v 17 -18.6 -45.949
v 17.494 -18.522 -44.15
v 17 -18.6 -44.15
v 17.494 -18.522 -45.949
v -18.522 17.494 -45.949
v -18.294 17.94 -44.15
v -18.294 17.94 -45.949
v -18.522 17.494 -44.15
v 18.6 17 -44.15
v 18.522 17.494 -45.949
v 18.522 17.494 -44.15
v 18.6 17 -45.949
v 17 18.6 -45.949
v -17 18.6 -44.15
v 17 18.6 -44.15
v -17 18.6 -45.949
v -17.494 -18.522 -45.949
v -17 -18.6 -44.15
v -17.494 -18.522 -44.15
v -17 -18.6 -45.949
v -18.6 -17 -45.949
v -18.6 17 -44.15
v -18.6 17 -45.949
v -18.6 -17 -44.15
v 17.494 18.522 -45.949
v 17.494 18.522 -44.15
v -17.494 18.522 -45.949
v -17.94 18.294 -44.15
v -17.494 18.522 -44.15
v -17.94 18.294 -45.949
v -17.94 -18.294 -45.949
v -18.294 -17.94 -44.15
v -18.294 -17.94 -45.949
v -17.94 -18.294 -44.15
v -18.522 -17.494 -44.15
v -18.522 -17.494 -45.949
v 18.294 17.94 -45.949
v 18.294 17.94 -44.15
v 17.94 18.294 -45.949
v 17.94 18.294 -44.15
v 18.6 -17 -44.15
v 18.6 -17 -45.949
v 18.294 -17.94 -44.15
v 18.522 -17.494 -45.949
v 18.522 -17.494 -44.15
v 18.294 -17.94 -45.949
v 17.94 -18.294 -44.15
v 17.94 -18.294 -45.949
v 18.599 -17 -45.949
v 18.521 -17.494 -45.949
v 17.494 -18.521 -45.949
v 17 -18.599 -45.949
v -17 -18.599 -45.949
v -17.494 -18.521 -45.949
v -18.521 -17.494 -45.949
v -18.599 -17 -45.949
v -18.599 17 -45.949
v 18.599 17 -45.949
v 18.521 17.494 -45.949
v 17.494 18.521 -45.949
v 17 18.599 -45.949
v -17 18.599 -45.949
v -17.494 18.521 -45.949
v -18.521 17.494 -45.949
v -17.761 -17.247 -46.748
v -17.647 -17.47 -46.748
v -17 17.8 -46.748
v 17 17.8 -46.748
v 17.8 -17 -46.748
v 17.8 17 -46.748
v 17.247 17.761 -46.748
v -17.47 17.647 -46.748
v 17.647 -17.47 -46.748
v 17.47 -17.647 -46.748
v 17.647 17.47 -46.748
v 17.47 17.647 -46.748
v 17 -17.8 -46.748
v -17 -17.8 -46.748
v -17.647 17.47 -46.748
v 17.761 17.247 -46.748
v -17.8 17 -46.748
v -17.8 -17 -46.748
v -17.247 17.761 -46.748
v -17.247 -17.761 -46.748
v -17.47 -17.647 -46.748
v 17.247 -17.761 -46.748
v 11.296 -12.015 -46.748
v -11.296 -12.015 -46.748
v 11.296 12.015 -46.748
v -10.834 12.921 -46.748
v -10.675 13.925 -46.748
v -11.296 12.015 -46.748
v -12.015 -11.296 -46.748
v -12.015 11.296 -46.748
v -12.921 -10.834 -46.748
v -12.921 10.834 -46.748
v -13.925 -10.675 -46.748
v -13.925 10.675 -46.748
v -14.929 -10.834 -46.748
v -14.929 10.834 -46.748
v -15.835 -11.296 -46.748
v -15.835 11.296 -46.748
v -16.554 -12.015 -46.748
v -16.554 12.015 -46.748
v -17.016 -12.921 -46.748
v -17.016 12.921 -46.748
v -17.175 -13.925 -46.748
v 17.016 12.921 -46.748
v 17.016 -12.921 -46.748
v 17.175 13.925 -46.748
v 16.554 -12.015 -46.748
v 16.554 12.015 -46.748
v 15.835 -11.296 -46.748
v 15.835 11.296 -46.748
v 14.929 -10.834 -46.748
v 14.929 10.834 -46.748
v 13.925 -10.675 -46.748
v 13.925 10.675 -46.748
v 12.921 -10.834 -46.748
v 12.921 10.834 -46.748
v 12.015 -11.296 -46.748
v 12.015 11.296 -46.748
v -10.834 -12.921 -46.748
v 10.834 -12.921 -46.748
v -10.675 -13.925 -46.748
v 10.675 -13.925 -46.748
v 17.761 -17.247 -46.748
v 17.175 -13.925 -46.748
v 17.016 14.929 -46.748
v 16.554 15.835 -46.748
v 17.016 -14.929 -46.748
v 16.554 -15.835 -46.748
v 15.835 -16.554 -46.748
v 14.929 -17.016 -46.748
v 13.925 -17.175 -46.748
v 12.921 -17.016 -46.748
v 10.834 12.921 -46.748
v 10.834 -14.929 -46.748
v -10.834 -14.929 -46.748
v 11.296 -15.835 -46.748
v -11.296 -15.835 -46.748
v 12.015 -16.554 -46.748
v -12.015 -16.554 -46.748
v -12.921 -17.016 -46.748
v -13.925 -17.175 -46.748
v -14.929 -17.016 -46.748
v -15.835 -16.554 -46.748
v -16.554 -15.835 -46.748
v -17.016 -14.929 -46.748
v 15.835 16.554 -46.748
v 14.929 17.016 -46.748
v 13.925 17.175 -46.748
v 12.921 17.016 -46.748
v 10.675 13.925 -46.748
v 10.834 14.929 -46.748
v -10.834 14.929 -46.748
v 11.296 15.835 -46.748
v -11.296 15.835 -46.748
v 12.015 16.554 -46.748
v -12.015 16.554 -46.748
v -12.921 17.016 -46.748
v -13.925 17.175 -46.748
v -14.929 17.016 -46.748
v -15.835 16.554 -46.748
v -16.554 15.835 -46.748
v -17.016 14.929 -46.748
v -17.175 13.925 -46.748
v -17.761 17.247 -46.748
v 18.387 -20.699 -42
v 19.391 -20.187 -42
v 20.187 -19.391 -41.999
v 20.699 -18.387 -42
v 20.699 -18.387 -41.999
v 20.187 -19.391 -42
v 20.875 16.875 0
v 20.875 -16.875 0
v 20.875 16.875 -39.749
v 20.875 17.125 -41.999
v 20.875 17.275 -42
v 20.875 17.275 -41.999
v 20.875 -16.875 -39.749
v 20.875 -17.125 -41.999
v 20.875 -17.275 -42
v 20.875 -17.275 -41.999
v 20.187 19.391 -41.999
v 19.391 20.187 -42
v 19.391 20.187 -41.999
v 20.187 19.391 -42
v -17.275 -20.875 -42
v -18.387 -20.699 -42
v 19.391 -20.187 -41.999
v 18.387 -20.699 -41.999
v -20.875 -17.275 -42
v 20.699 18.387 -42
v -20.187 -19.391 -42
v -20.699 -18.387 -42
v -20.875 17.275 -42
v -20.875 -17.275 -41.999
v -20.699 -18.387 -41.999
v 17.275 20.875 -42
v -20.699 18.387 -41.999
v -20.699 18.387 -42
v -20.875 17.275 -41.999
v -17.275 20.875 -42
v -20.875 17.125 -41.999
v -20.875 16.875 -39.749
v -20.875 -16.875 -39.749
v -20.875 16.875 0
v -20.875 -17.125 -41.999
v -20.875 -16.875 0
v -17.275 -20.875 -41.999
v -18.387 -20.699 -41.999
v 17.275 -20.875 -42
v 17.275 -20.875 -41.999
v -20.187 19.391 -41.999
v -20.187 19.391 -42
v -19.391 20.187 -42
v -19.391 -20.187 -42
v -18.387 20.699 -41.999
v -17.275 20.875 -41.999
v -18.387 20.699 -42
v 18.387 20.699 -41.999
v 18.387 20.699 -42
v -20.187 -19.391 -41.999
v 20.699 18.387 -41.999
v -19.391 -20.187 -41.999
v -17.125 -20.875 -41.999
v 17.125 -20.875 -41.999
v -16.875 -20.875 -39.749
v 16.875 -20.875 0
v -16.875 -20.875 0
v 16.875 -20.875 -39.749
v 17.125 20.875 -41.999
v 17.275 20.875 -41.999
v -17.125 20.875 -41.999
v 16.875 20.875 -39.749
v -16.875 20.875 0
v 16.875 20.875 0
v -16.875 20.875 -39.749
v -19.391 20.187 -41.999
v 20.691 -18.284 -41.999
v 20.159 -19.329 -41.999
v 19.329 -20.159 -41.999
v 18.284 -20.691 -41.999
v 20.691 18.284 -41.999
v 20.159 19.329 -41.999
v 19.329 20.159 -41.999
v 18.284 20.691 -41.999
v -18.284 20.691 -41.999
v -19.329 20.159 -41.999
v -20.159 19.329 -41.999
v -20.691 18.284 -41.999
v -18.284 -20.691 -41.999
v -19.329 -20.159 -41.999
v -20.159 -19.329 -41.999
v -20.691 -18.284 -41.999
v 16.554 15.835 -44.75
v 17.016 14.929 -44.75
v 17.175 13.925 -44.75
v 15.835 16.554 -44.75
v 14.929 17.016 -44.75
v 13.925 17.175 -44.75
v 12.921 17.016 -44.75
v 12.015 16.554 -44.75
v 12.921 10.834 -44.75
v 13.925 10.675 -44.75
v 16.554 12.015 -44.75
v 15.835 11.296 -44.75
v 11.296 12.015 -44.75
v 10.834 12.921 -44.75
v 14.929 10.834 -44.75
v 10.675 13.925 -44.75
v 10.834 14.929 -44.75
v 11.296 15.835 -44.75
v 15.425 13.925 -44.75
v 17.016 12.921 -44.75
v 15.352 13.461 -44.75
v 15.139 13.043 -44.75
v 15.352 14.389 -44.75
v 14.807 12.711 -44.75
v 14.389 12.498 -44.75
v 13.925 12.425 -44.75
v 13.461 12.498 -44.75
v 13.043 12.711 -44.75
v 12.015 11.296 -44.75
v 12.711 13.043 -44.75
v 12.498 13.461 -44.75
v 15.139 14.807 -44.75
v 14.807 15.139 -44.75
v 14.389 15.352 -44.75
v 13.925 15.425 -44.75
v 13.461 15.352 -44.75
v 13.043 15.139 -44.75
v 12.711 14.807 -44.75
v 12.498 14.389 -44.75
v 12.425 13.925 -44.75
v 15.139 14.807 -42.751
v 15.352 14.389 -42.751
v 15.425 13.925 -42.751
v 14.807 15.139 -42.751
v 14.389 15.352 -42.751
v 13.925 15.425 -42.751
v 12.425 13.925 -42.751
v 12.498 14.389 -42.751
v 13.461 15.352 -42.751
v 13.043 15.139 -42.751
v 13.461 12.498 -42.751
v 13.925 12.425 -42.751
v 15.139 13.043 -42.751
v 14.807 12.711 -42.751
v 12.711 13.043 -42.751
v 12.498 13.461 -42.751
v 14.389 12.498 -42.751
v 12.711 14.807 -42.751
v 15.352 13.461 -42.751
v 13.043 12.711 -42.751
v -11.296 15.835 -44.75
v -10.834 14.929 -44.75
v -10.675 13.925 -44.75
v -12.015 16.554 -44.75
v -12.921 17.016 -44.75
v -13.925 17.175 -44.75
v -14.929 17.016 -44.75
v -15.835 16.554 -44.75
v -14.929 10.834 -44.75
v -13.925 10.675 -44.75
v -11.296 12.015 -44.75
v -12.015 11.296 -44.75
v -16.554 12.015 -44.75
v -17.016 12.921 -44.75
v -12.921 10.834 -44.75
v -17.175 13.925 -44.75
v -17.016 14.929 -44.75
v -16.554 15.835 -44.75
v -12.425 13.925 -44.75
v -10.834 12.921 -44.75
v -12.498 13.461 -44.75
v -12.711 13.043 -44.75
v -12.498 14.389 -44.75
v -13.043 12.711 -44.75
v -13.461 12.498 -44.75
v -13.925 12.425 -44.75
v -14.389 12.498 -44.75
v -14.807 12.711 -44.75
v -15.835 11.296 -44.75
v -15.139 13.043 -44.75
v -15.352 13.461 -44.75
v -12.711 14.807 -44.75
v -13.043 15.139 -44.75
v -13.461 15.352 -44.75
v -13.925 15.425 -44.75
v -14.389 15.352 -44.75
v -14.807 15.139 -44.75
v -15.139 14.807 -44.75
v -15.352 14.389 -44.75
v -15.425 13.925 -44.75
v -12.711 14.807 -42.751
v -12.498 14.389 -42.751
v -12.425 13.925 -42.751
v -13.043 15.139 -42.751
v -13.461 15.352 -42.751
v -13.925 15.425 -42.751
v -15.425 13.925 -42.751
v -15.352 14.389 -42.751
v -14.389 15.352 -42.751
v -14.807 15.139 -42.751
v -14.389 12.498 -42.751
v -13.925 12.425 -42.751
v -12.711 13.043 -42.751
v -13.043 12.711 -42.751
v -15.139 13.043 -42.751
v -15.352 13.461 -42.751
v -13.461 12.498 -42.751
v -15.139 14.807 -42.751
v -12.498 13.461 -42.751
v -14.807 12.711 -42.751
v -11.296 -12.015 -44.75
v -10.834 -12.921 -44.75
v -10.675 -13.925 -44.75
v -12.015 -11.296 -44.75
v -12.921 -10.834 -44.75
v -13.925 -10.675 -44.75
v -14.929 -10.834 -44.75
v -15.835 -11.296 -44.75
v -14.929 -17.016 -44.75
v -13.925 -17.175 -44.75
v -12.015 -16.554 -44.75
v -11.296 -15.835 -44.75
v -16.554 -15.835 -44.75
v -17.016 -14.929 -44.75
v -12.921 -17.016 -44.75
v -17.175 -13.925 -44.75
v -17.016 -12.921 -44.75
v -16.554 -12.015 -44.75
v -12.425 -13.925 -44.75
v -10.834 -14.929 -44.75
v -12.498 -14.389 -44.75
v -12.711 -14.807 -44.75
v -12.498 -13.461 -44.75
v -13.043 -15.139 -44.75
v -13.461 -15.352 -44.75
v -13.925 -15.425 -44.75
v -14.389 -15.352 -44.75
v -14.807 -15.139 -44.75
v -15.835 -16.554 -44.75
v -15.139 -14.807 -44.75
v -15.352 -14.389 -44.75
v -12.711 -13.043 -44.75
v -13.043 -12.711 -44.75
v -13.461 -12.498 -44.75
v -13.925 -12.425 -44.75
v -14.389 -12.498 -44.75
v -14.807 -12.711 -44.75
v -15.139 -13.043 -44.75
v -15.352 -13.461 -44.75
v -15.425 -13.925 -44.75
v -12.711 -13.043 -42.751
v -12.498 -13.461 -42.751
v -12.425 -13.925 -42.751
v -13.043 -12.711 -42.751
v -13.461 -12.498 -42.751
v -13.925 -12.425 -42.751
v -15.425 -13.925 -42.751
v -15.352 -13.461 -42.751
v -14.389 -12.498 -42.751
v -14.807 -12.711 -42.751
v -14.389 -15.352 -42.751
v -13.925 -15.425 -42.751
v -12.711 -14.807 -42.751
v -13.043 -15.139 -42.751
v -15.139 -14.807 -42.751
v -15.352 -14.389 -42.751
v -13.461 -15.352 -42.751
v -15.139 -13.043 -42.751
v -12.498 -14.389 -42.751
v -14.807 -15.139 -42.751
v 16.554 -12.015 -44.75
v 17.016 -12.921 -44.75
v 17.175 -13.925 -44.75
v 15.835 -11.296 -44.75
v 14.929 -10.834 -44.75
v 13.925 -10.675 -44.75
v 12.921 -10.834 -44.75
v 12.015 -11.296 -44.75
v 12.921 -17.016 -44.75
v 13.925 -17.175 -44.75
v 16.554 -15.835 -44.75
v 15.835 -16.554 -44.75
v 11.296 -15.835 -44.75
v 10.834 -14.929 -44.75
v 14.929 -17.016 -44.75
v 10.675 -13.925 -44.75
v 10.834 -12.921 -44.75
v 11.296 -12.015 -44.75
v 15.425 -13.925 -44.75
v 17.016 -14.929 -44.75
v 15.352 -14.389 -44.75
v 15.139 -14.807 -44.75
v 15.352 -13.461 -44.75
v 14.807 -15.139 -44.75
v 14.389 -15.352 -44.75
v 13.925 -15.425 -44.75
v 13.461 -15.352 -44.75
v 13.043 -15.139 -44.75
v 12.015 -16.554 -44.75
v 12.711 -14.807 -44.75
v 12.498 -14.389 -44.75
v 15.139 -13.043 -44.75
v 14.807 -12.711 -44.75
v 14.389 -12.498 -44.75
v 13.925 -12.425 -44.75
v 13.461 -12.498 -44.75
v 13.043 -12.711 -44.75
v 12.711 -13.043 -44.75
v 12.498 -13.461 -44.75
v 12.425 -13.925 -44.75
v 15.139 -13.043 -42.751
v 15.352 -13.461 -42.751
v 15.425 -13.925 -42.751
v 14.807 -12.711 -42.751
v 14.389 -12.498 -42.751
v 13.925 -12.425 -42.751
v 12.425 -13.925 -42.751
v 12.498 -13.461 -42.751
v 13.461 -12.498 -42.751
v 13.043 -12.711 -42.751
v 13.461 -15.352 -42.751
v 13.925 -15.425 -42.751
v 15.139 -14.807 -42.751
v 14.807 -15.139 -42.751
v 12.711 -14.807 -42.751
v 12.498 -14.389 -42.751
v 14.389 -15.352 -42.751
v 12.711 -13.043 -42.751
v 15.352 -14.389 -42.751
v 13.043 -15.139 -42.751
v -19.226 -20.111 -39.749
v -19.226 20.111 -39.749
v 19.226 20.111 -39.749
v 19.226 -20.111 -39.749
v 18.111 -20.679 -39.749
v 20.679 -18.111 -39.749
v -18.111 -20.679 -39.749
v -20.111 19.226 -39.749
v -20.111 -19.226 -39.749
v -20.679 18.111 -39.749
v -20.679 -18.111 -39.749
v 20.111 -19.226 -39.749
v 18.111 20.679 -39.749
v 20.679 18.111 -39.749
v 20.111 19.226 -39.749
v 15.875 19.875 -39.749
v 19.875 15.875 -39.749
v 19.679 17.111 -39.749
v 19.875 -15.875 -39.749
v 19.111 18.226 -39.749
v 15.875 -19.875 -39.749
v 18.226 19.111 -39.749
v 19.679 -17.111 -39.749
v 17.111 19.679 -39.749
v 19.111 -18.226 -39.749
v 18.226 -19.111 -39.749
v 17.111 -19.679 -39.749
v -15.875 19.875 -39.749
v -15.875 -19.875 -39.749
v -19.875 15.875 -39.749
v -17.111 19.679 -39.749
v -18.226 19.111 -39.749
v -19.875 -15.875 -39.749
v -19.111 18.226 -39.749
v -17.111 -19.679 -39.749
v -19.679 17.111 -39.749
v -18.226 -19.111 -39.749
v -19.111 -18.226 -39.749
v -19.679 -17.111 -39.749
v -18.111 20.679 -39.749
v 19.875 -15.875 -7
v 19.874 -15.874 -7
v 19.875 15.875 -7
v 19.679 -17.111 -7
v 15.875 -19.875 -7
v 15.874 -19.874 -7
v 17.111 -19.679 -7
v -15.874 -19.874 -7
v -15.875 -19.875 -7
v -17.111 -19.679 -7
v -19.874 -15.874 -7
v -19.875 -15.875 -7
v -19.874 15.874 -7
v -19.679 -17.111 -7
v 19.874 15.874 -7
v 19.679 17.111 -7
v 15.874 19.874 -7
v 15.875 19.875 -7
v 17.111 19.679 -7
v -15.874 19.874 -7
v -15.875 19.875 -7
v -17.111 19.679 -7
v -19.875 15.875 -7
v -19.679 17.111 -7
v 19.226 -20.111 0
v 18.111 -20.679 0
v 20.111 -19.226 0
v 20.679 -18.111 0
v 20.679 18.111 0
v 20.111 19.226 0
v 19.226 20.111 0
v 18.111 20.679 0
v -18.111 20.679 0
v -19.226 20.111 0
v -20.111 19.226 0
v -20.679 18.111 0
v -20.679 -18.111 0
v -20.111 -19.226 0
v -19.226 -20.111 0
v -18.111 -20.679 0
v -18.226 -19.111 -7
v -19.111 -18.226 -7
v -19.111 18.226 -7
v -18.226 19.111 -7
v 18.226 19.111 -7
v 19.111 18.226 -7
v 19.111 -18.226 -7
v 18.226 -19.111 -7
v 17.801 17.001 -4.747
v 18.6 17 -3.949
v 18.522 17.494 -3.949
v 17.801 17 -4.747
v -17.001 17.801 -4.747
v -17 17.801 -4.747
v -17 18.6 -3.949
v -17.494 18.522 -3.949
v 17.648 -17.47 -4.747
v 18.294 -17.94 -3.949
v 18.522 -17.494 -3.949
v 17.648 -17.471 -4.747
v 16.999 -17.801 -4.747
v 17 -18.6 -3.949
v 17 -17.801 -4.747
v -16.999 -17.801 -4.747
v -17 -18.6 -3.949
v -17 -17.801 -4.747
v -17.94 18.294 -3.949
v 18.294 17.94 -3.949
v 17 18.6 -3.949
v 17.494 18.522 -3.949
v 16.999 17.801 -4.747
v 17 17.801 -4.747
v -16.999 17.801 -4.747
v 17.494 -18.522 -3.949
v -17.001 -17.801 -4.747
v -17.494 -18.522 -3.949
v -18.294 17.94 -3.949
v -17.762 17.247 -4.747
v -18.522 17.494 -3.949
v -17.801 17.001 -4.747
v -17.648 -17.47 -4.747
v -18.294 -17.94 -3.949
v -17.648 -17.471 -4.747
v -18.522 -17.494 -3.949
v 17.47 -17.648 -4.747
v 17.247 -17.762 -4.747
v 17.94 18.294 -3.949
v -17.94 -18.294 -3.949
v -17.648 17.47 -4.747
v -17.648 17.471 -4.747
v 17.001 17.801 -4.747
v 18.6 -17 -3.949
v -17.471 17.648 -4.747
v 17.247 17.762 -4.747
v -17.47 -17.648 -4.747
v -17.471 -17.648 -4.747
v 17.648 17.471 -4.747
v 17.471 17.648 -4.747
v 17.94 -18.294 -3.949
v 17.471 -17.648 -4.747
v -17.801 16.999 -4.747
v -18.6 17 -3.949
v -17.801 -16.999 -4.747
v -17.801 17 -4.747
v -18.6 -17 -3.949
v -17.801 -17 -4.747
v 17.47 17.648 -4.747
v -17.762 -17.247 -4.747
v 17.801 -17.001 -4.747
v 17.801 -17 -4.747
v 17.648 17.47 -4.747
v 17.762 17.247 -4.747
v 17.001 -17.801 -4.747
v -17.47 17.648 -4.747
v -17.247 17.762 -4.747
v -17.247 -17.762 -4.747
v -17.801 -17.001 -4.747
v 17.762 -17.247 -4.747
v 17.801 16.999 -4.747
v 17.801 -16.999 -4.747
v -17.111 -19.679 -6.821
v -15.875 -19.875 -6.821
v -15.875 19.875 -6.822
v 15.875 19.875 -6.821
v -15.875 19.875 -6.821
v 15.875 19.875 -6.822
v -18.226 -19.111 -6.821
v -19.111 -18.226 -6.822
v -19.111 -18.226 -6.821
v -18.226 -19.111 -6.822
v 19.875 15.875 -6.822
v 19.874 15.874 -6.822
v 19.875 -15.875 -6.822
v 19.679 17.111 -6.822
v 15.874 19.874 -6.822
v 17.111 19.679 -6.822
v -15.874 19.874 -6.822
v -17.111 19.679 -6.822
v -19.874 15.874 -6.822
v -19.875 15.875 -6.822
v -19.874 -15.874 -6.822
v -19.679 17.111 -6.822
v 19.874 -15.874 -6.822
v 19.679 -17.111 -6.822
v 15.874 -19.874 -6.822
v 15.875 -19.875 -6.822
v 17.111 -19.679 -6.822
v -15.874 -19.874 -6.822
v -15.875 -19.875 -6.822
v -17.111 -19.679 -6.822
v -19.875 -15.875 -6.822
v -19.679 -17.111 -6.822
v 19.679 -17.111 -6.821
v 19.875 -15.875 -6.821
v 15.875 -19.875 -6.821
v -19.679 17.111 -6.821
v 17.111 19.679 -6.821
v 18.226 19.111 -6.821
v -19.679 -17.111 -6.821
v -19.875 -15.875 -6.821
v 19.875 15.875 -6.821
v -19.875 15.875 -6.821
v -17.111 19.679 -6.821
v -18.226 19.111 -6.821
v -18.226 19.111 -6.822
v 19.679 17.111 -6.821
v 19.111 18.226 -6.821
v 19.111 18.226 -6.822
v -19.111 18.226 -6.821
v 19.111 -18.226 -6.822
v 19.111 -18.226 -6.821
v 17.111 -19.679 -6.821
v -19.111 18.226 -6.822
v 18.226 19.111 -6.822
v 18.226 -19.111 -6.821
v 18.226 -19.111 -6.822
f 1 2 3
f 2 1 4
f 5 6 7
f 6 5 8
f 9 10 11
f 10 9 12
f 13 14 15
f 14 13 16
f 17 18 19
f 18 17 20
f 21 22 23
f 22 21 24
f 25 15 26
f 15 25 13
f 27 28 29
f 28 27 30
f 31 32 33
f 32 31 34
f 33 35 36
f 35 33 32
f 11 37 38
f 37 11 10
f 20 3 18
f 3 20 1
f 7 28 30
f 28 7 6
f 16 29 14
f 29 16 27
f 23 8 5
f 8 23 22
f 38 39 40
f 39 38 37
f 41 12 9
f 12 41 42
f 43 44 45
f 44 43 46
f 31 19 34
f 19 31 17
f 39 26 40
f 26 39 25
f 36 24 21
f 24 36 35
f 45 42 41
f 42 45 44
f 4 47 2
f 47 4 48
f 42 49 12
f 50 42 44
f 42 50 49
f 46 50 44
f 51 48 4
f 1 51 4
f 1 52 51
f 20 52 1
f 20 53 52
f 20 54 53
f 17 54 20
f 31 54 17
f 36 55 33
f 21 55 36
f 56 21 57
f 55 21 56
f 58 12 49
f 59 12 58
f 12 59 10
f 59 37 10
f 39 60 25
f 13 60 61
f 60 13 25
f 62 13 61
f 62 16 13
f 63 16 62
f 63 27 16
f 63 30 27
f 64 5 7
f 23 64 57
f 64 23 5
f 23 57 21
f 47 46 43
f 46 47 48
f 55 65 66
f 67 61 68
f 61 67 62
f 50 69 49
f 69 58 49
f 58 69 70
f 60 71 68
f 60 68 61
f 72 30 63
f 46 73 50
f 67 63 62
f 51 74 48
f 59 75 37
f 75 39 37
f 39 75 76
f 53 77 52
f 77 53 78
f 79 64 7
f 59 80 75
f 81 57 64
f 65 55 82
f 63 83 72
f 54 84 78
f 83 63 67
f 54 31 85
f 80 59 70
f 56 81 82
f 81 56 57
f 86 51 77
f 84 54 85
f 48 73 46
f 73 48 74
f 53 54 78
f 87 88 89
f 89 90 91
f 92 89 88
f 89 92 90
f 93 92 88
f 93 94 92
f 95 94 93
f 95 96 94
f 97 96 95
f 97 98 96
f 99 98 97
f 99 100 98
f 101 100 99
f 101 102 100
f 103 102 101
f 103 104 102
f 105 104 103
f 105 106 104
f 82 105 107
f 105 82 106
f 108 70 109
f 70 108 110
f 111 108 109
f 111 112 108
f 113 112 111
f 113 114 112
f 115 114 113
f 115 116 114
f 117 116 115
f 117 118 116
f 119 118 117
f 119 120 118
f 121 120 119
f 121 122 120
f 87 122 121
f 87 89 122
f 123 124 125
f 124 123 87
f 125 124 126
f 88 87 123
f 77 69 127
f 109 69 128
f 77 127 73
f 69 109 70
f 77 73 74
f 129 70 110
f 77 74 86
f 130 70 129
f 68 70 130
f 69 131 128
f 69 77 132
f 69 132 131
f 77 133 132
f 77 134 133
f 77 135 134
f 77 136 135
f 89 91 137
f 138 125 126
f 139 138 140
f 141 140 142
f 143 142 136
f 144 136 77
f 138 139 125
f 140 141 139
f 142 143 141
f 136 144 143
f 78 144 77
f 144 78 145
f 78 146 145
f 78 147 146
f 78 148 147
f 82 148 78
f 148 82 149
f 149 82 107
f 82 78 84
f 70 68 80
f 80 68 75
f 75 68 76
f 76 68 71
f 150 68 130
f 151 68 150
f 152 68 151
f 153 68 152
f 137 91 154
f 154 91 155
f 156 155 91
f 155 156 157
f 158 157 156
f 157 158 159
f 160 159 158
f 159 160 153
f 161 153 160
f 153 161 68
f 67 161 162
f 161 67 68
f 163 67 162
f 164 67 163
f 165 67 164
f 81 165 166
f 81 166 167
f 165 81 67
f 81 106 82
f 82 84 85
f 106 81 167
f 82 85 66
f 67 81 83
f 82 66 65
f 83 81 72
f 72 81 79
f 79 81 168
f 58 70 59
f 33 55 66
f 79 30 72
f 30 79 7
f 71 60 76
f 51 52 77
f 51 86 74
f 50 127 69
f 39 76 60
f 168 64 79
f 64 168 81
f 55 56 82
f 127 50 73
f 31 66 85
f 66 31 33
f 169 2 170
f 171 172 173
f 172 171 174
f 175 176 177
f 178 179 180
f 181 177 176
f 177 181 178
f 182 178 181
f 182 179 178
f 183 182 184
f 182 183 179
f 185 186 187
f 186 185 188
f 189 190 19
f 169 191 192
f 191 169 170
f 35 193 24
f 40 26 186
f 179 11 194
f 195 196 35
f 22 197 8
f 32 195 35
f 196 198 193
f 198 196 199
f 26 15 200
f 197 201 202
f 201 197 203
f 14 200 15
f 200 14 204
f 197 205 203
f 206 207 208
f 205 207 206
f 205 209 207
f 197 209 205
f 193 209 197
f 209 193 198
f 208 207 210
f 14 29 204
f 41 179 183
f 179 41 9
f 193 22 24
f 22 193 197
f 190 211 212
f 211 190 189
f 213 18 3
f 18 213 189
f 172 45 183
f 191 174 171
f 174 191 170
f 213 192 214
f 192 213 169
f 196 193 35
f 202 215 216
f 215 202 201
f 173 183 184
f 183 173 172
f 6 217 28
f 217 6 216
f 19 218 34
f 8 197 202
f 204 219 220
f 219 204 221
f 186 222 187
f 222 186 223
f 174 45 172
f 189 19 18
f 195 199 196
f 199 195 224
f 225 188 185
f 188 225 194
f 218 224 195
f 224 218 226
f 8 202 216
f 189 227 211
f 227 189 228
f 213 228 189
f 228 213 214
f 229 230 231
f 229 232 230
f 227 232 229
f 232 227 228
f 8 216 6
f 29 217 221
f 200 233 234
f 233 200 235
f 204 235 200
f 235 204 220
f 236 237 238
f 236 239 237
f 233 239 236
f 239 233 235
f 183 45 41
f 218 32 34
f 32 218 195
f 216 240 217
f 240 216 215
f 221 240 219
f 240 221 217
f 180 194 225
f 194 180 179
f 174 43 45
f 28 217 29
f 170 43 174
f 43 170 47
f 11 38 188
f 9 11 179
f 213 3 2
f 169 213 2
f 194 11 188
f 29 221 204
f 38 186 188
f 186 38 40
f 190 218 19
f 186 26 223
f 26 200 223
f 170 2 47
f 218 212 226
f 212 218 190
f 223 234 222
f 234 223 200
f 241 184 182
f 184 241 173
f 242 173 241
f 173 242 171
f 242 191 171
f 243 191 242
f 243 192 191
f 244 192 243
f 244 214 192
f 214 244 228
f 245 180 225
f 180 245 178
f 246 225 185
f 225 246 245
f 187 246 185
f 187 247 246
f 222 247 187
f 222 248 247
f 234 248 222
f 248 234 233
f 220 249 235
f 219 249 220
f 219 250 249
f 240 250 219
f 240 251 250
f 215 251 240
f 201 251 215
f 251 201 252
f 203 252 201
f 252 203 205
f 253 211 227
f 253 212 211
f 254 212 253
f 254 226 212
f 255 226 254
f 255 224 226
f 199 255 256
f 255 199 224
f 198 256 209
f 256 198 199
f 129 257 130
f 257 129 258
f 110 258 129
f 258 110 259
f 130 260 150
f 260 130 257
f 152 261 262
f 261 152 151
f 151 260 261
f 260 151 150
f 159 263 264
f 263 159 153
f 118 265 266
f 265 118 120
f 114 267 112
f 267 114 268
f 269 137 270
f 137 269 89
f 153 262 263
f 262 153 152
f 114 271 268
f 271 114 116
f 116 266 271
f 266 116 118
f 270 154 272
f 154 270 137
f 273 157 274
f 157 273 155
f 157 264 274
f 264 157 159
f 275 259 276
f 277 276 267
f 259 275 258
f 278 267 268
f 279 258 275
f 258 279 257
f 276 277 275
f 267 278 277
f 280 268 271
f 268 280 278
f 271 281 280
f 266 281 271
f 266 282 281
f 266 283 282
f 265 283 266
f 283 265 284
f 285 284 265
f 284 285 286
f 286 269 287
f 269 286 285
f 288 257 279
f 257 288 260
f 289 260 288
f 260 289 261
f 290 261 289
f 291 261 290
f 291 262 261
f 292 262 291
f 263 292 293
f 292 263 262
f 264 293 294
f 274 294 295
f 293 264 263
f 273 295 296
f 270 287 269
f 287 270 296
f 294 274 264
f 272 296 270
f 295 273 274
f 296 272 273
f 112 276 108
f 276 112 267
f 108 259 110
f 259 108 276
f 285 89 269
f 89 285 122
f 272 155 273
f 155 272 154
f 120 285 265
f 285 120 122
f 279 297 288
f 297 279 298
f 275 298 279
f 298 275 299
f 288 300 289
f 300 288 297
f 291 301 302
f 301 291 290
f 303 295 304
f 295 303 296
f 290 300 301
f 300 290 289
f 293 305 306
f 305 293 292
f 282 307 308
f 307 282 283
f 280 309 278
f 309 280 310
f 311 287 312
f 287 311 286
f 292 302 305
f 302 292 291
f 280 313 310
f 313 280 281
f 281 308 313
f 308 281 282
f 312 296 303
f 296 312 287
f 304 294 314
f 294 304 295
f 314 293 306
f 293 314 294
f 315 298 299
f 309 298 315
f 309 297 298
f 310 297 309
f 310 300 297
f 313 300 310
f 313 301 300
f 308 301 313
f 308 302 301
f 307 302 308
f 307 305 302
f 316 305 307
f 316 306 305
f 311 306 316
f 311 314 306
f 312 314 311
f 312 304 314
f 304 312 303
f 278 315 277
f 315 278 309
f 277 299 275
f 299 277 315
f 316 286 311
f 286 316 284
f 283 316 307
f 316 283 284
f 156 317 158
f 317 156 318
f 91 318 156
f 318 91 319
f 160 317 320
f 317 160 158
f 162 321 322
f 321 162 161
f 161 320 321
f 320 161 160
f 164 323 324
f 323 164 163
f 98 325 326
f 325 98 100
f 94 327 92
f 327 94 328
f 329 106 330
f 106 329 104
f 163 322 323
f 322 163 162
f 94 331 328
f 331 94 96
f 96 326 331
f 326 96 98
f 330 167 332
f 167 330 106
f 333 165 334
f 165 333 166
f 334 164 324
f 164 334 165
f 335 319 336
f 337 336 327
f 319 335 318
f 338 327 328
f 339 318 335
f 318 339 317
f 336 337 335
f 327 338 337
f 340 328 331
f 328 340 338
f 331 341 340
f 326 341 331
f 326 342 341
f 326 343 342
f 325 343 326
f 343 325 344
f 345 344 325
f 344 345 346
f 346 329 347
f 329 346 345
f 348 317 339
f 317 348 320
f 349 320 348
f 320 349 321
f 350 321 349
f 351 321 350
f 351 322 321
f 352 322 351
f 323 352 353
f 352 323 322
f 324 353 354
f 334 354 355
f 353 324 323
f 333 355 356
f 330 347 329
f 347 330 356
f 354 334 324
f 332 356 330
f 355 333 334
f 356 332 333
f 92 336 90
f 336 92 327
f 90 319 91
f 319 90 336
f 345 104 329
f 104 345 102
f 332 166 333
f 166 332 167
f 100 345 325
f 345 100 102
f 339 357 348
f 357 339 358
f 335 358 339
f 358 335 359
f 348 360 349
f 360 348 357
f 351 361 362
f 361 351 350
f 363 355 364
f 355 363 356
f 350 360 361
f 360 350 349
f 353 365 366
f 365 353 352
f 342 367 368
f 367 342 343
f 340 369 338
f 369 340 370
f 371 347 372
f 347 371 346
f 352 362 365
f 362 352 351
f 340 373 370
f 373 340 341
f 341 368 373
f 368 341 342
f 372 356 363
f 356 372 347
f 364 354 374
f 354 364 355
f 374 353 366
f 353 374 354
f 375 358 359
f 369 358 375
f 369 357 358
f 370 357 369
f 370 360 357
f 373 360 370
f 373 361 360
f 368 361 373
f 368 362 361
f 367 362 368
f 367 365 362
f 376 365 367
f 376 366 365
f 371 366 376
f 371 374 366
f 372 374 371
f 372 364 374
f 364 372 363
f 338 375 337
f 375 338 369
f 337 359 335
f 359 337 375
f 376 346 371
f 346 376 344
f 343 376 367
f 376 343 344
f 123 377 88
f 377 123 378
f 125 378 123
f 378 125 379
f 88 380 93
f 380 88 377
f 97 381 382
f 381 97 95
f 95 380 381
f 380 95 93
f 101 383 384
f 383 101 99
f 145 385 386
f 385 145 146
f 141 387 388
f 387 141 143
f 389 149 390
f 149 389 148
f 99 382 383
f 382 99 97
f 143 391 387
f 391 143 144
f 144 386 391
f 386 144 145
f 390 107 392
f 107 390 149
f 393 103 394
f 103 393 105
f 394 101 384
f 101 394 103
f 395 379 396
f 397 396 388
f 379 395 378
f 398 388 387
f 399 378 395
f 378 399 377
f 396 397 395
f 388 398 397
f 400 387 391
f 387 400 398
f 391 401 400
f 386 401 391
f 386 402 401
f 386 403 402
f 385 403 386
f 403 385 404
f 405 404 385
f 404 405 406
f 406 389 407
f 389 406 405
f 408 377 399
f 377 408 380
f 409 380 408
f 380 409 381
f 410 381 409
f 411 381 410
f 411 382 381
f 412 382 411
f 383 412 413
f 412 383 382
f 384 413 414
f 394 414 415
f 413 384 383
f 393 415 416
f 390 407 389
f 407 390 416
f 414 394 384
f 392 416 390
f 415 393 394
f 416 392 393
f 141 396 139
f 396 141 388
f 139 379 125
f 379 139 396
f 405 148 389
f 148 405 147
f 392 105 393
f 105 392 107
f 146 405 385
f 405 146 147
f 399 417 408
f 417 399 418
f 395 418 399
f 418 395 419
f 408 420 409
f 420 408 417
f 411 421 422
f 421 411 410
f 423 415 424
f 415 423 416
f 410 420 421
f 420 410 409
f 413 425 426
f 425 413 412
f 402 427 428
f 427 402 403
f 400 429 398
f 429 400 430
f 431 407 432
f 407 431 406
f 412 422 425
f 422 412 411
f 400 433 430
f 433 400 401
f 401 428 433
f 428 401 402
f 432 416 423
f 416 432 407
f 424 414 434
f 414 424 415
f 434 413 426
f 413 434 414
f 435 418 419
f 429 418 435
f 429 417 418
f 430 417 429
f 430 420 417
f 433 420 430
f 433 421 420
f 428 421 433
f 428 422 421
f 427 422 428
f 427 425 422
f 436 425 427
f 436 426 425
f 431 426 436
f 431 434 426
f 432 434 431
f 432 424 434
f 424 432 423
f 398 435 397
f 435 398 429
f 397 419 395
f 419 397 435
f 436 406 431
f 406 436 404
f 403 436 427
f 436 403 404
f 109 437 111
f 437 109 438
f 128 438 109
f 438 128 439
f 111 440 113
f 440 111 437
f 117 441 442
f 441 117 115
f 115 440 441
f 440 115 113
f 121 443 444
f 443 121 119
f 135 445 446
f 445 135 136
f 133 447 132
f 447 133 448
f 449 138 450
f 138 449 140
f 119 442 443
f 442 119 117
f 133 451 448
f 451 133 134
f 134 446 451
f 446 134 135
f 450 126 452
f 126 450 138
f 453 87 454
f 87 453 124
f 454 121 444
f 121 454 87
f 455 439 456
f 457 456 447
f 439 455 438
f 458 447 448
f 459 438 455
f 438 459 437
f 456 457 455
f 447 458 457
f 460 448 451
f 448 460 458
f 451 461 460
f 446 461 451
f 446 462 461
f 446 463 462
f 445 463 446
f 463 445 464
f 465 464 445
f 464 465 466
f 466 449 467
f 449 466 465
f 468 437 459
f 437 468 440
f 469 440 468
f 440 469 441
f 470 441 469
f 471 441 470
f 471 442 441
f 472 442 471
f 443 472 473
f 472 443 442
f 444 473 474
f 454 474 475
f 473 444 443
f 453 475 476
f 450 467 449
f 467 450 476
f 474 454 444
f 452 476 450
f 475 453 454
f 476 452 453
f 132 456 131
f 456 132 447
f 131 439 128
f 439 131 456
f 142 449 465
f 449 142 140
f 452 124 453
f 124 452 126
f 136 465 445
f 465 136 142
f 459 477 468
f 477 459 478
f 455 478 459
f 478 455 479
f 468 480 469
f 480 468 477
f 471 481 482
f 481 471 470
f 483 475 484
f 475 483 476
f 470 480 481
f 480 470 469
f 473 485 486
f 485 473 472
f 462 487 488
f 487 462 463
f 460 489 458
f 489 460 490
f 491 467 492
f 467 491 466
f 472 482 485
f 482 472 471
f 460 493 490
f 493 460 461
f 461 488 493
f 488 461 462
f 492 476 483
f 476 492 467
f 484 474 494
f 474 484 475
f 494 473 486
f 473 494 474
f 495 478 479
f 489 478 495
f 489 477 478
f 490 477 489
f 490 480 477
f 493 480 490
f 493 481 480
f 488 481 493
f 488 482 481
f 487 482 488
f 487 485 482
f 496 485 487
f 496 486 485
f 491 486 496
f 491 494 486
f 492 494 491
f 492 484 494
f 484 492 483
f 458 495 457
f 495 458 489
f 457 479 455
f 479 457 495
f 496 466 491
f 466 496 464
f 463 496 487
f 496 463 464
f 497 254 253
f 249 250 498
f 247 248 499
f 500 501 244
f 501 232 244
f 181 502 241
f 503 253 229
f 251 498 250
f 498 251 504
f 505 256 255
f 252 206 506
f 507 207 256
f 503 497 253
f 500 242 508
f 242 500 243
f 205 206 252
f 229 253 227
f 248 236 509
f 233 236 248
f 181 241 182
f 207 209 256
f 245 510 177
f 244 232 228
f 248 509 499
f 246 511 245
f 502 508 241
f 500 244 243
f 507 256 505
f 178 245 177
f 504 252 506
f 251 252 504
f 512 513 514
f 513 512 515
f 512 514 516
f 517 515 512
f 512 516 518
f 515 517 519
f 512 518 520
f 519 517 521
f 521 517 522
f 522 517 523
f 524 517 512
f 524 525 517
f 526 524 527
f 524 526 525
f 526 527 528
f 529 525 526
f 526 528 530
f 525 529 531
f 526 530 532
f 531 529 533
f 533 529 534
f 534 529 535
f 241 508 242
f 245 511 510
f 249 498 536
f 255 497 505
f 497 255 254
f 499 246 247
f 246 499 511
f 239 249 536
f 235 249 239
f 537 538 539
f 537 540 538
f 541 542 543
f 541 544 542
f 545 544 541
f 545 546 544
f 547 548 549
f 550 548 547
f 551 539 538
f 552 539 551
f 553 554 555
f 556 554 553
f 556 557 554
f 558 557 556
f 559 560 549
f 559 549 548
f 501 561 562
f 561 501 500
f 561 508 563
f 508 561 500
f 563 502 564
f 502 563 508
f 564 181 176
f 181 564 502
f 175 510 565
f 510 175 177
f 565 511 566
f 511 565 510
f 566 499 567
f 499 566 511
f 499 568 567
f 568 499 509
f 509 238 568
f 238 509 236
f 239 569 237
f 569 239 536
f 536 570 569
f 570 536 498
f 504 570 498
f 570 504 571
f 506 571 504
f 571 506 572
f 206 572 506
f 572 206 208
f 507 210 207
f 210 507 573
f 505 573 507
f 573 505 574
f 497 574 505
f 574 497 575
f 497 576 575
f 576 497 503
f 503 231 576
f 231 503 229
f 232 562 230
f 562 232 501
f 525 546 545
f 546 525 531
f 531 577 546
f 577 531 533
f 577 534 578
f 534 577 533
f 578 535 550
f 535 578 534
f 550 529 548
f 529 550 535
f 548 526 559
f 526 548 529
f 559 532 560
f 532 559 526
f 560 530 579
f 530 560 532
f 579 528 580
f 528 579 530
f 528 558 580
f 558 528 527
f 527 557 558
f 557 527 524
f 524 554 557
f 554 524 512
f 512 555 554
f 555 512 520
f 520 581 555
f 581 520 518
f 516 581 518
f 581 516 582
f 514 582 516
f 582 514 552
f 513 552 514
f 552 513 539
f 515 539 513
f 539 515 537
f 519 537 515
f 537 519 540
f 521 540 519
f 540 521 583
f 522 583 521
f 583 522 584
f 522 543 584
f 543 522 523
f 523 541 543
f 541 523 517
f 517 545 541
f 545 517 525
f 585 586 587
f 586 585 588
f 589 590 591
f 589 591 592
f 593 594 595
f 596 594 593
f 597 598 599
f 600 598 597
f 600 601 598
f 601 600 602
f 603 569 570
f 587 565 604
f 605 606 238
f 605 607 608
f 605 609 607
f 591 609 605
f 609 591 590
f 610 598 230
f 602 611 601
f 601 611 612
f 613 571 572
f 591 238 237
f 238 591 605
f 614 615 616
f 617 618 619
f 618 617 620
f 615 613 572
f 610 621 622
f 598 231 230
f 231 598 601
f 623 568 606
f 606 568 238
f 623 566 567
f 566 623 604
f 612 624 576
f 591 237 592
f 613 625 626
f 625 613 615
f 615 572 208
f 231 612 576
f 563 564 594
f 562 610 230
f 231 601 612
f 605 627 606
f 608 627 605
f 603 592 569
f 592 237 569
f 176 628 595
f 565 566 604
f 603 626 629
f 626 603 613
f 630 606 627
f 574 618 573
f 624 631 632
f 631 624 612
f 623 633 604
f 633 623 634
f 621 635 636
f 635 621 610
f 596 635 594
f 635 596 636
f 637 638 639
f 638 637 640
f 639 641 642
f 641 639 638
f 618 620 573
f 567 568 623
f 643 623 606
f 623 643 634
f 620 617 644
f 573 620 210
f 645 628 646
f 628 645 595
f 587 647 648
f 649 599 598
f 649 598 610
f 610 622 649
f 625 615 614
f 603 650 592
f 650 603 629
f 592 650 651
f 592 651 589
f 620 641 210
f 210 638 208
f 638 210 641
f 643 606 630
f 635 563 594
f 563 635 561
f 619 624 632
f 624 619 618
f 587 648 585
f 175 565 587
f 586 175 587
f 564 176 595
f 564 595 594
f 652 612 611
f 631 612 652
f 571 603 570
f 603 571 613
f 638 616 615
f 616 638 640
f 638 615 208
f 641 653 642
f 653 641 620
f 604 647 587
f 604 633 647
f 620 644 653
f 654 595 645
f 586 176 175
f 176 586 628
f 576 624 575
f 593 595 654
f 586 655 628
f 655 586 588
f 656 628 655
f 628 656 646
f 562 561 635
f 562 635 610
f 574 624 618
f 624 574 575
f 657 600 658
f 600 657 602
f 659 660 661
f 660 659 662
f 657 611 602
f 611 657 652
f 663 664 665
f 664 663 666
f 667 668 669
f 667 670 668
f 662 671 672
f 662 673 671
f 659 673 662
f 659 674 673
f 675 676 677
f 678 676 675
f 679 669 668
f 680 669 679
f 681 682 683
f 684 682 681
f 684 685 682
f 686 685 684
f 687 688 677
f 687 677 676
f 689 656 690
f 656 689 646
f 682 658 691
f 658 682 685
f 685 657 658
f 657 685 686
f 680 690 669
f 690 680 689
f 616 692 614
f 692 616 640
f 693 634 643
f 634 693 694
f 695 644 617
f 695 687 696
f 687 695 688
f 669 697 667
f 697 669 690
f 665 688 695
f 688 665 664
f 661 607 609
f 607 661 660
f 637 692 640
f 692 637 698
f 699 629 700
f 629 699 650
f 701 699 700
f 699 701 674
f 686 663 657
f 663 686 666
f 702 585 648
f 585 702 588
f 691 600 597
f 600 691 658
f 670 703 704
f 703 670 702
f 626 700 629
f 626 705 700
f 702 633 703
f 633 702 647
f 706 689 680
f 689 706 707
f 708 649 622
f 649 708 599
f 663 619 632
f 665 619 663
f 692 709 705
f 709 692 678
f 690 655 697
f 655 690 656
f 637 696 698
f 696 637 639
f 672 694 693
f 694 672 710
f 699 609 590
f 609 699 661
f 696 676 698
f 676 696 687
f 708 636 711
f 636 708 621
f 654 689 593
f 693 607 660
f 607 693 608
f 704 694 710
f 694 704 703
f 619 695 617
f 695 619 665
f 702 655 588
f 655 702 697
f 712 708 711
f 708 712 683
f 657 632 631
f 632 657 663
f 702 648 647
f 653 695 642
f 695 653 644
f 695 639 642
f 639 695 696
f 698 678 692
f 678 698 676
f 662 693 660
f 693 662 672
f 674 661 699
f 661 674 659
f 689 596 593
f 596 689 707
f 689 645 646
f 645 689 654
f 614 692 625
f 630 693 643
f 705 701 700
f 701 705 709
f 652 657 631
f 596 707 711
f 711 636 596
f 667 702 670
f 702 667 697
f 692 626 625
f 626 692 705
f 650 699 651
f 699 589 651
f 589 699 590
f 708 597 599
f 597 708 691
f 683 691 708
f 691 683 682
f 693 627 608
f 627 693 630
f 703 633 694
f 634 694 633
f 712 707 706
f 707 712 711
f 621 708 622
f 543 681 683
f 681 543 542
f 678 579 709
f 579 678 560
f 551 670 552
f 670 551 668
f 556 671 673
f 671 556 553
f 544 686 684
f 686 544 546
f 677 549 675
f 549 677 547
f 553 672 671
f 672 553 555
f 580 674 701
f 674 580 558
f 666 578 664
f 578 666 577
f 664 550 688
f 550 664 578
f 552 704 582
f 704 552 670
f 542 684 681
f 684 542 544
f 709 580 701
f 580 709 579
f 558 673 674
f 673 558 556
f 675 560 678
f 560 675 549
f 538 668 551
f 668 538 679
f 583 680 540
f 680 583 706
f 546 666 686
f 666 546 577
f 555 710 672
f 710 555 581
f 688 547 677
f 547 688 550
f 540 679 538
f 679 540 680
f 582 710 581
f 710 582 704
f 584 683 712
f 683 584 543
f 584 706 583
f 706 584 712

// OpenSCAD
// file: gridfinity_cup_base.scad
include <gridfinity_cup_base_vars.scad>
use <../lib/rounded_square.scad>;

module gridfinity_cup_base(magnets = true)
{


    module base_no_magnets()
    {
        translate([ 0, 0, -top_slope_height ])
        {
            hull()
            {
                translate([ 0, 0, top_slope_height ]) linear_extrude(0.001)
                    rounded_square(cup_base_top_size, radius = top_radius, center = true);
                linear_extrude(0.001) rounded_square(cup_base_middle_size, radius = middle_radius, center = true);
            }
            translate([ 0, 0, -middle_height + 0.001 ])
            {

                linear_extrude(middle_height)
                    rounded_square(cup_base_middle_size, radius = middle_radius, center = true);
                translate([ 0, 0, -bottom_slope_height + 0.001 ])
                {
                    hull()
                    {
                        linear_extrude(0.001)
                            rounded_square(cup_base_bottom_size, radius = bottom_radius, center = true);
                        translate([ 0, 0, bottom_slope_height ]) linear_extrude(0.001)
                            rounded_square(cup_base_middle_size, radius = middle_radius, center = true);
                    }
                }
            }
        }
    }

    module magnet()
    {
        height = 2;
        outter_radius = 3.25;
        inner_radius = 1.5;
        translate([ 0, 0, height / 2 ])
        {
            cylinder(h = height, r = outter_radius, center = true);
            translate([ 0, 0, height - 0.001 ]) cylinder(h = height, r = inner_radius, center = true);
        }
    }

    if (magnets)
    {
        magnet_xy_offset = (cup_base_bottom_size - 7.75) / 2;
        magnet_z_offset = -middle_height - top_slope_height - bottom_slope_height;
        difference()
        {
            base_no_magnets();
            translate([ magnet_xy_offset, magnet_xy_offset, magnet_z_offset ]) magnet();
            translate([ -magnet_xy_offset, magnet_xy_offset, magnet_z_offset ]) magnet();
            translate([ -magnet_xy_offset, -magnet_xy_offset, magnet_z_offset ]) magnet();
            translate([ magnet_xy_offset, -magnet_xy_offset, magnet_z_offset ]) magnet();
        }
    }
    else
    {
        base_no_magnets();
    }
}

gridfinity_cup_base(magnets = true);
// file: ../lib/rounded_square.scad
module rounded_square(size, radius, center = false)
{
    new_size = is_list(size) ? [ size[0] - radius * 2, size[1] - radius * 2 ] : size - radius * 2;
    offset(radius) square(new_size, center);
}

rounded_square(size = 10, radius = 2, center = true);
// file: ../lib/rounded_hollow_square.scad
module rounded_hollow_square(outer_size, thickness, radius)
{
    new_outer_size = is_list(outer_size) ? [ outer_size[0] - radius * 2, outer_size[1] - radius * 2 ]
                                         : [ outer_size - radius * 2, outer_size - radius * 2 ];
    difference()
    {
        offset(radius) square(new_outer_size, center = true);
        offset(radius) square([ new_outer_size[0] - thickness, new_outer_size[1] - thickness ], center = true);
    }
}

linear_extrude(10) rounded_hollow_square(outer_size = [ 50, 100 ], thickness = 10, radius = 10);
// file: gridfinity_cup_base_vars.scad
cup_base_bottom_size = 35.6;
cup_base_middle_size = 37.2;
cup_base_top_size = 41.75;

bottom_slope_height = 0.8;
top_slope_height = 2.15;
middle_height = 1.8;

// All in degrees
bottom_radius = 1.6 / 2;
middle_radius = 3.2 / 2;
top_radius = 7.2 / 2;
// main file
include <gridfinity_cup_base_vars.scad>
use <../lib/rounded_hollow_square.scad>;
use <../lib/rounded_square.scad>;
use <gridfinity_cup_base.scad>;

$fn = 20;

module gridfinity_cup_with_walls(rows = 1, columns = 1, layers = 3, use_stacking_lip = true, use_magnets = true)
{

    floor_height = 2.25;
    floor_base_angle = 3.75;

    width = rows * cup_base_top_size;
    length = columns * cup_base_top_size;
    walls_height = (layers - 1) * 7 - floor_height;
    walls_thickness = 2;
    walls_radius = 4;

    translate([ 0, 0, -7 ])
    {
        translate([ 0, 0, -walls_height ])
        {
            translate([ 0, 0, -floor_height ])
            {
                // Bases
                translate([ -(width - cup_base_top_size) / 2, -(length - 41.75) / 2 ])
                {
                    for (row = [0:rows - 1])
                    {
                        for (column = [0:columns - 1])
                        {
                            translate([ row * 42, column * 42, 0 ]) gridfinity_cup_base(magnets = use_magnets);
                        }
                    }
                }

                internal_floor();
            }
            walls();
        }
        if (use_stacking_lip)
        {
            stacking_lip();
        }
        else
        {
            linear_extrude(7) rounded_hollow_square(outer_size = [ width, length ], thickness = walls_thickness,
                                                    radius = walls_radius);
        }
    }

    module internal_floor()
    {
        hull()
        {
            linear_extrude(0.001) rounded_square(size = [ width, length ], radius = floor_base_angle, center = true);
            translate([ 0, 0, floor_height ]) linear_extrude(0.001)
                rounded_square(size = [ width, length ], radius = walls_radius, center = true);
        }
    }

    module walls()
    {

        linear_extrude(walls_height)
            rounded_hollow_square(outer_size = [ width, length ], thickness = walls_thickness, radius = walls_radius);
    }

    module stacking_lip()
    {
        // top
        stacking_lip_bottom_width = width - (cup_base_top_size - cup_base_bottom_size);
        stacking_lip_middle_width = width - (cup_base_top_size - cup_base_middle_size);
        stacking_lip_bottom_length = length - (cup_base_top_size - cup_base_bottom_size);
        stacking_lip_middle_length = length - (cup_base_top_size - cup_base_middle_size);
        stacking_lip_top_width = width;
        stacking_lip_top_length = length;

        // This is to make sure the overhang is not over 45 degrees
        stacking_lip_overhang_height = (cup_base_top_size - cup_base_bottom_size - walls_thickness) / 2;

        total_lip_height =
            stacking_lip_overhang_height + bottom_slope_height + middle_height + top_slope_height - 0.001 * 4;

        difference()
        {
            linear_extrude(7) rounded_square(size = [ width, length ], radius = walls_radius, center = true);
            translate([ 0, 0, 7 - total_lip_height - 0.001 ])
            {
                translate([ 0, 0, stacking_lip_overhang_height - 0.001 ]) hull()
                {
                    translate([ 0, 0, bottom_slope_height - 0.001 ])
                    {
                        linear_extrude(middle_height)
                            rounded_square(size = [ stacking_lip_middle_width, stacking_lip_middle_length ],
                                           radius = middle_radius, center = true);

                        translate([ 0, 0, middle_height - 0.001 ]) hull()
                        {
                            translate([ 0, 0, top_slope_height ]) linear_extrude(0.001)
                                rounded_square(size = [ stacking_lip_top_width, stacking_lip_top_length ],
                                               radius = walls_radius, center = true);
                            linear_extrude(0.001)
                                rounded_square(size = [ stacking_lip_middle_width, stacking_lip_middle_length ],
                                               radius = middle_radius, center = true);
                        }
                    }
                    translate([ 0, 0, bottom_slope_height ]) linear_extrude(0.001)
                        rounded_square(size = [ stacking_lip_middle_width, stacking_lip_middle_length ],
                                       radius = middle_radius, center = true);
                    linear_extrude(0.001)
                        rounded_square(size = [ stacking_lip_bottom_width, stacking_lip_bottom_length ],
                                       radius = bottom_radius, center = true);
                }
                hull()
                {
                    translate([ 0, 0, stacking_lip_overhang_height ]) linear_extrude(0.001)
                        rounded_square(size = [ stacking_lip_bottom_width, stacking_lip_bottom_length ],
                                       radius = bottom_radius, center = true);
                    linear_extrude(0.001) rounded_square(size = [ width - walls_thickness, length - walls_thickness ],
                                                         radius = walls_radius, center = true);
                }
                translate([ 0, 0, -10 + 0.001 ]) linear_extrude(10)
                    rounded_square(size = [ width - walls_thickness - 0.001, length - walls_thickness - 0.001 ],
                                   radius = walls_radius, center = true);
            }
        }
    }
}

gridfinity_cup_with_walls(1, 1, 6);
